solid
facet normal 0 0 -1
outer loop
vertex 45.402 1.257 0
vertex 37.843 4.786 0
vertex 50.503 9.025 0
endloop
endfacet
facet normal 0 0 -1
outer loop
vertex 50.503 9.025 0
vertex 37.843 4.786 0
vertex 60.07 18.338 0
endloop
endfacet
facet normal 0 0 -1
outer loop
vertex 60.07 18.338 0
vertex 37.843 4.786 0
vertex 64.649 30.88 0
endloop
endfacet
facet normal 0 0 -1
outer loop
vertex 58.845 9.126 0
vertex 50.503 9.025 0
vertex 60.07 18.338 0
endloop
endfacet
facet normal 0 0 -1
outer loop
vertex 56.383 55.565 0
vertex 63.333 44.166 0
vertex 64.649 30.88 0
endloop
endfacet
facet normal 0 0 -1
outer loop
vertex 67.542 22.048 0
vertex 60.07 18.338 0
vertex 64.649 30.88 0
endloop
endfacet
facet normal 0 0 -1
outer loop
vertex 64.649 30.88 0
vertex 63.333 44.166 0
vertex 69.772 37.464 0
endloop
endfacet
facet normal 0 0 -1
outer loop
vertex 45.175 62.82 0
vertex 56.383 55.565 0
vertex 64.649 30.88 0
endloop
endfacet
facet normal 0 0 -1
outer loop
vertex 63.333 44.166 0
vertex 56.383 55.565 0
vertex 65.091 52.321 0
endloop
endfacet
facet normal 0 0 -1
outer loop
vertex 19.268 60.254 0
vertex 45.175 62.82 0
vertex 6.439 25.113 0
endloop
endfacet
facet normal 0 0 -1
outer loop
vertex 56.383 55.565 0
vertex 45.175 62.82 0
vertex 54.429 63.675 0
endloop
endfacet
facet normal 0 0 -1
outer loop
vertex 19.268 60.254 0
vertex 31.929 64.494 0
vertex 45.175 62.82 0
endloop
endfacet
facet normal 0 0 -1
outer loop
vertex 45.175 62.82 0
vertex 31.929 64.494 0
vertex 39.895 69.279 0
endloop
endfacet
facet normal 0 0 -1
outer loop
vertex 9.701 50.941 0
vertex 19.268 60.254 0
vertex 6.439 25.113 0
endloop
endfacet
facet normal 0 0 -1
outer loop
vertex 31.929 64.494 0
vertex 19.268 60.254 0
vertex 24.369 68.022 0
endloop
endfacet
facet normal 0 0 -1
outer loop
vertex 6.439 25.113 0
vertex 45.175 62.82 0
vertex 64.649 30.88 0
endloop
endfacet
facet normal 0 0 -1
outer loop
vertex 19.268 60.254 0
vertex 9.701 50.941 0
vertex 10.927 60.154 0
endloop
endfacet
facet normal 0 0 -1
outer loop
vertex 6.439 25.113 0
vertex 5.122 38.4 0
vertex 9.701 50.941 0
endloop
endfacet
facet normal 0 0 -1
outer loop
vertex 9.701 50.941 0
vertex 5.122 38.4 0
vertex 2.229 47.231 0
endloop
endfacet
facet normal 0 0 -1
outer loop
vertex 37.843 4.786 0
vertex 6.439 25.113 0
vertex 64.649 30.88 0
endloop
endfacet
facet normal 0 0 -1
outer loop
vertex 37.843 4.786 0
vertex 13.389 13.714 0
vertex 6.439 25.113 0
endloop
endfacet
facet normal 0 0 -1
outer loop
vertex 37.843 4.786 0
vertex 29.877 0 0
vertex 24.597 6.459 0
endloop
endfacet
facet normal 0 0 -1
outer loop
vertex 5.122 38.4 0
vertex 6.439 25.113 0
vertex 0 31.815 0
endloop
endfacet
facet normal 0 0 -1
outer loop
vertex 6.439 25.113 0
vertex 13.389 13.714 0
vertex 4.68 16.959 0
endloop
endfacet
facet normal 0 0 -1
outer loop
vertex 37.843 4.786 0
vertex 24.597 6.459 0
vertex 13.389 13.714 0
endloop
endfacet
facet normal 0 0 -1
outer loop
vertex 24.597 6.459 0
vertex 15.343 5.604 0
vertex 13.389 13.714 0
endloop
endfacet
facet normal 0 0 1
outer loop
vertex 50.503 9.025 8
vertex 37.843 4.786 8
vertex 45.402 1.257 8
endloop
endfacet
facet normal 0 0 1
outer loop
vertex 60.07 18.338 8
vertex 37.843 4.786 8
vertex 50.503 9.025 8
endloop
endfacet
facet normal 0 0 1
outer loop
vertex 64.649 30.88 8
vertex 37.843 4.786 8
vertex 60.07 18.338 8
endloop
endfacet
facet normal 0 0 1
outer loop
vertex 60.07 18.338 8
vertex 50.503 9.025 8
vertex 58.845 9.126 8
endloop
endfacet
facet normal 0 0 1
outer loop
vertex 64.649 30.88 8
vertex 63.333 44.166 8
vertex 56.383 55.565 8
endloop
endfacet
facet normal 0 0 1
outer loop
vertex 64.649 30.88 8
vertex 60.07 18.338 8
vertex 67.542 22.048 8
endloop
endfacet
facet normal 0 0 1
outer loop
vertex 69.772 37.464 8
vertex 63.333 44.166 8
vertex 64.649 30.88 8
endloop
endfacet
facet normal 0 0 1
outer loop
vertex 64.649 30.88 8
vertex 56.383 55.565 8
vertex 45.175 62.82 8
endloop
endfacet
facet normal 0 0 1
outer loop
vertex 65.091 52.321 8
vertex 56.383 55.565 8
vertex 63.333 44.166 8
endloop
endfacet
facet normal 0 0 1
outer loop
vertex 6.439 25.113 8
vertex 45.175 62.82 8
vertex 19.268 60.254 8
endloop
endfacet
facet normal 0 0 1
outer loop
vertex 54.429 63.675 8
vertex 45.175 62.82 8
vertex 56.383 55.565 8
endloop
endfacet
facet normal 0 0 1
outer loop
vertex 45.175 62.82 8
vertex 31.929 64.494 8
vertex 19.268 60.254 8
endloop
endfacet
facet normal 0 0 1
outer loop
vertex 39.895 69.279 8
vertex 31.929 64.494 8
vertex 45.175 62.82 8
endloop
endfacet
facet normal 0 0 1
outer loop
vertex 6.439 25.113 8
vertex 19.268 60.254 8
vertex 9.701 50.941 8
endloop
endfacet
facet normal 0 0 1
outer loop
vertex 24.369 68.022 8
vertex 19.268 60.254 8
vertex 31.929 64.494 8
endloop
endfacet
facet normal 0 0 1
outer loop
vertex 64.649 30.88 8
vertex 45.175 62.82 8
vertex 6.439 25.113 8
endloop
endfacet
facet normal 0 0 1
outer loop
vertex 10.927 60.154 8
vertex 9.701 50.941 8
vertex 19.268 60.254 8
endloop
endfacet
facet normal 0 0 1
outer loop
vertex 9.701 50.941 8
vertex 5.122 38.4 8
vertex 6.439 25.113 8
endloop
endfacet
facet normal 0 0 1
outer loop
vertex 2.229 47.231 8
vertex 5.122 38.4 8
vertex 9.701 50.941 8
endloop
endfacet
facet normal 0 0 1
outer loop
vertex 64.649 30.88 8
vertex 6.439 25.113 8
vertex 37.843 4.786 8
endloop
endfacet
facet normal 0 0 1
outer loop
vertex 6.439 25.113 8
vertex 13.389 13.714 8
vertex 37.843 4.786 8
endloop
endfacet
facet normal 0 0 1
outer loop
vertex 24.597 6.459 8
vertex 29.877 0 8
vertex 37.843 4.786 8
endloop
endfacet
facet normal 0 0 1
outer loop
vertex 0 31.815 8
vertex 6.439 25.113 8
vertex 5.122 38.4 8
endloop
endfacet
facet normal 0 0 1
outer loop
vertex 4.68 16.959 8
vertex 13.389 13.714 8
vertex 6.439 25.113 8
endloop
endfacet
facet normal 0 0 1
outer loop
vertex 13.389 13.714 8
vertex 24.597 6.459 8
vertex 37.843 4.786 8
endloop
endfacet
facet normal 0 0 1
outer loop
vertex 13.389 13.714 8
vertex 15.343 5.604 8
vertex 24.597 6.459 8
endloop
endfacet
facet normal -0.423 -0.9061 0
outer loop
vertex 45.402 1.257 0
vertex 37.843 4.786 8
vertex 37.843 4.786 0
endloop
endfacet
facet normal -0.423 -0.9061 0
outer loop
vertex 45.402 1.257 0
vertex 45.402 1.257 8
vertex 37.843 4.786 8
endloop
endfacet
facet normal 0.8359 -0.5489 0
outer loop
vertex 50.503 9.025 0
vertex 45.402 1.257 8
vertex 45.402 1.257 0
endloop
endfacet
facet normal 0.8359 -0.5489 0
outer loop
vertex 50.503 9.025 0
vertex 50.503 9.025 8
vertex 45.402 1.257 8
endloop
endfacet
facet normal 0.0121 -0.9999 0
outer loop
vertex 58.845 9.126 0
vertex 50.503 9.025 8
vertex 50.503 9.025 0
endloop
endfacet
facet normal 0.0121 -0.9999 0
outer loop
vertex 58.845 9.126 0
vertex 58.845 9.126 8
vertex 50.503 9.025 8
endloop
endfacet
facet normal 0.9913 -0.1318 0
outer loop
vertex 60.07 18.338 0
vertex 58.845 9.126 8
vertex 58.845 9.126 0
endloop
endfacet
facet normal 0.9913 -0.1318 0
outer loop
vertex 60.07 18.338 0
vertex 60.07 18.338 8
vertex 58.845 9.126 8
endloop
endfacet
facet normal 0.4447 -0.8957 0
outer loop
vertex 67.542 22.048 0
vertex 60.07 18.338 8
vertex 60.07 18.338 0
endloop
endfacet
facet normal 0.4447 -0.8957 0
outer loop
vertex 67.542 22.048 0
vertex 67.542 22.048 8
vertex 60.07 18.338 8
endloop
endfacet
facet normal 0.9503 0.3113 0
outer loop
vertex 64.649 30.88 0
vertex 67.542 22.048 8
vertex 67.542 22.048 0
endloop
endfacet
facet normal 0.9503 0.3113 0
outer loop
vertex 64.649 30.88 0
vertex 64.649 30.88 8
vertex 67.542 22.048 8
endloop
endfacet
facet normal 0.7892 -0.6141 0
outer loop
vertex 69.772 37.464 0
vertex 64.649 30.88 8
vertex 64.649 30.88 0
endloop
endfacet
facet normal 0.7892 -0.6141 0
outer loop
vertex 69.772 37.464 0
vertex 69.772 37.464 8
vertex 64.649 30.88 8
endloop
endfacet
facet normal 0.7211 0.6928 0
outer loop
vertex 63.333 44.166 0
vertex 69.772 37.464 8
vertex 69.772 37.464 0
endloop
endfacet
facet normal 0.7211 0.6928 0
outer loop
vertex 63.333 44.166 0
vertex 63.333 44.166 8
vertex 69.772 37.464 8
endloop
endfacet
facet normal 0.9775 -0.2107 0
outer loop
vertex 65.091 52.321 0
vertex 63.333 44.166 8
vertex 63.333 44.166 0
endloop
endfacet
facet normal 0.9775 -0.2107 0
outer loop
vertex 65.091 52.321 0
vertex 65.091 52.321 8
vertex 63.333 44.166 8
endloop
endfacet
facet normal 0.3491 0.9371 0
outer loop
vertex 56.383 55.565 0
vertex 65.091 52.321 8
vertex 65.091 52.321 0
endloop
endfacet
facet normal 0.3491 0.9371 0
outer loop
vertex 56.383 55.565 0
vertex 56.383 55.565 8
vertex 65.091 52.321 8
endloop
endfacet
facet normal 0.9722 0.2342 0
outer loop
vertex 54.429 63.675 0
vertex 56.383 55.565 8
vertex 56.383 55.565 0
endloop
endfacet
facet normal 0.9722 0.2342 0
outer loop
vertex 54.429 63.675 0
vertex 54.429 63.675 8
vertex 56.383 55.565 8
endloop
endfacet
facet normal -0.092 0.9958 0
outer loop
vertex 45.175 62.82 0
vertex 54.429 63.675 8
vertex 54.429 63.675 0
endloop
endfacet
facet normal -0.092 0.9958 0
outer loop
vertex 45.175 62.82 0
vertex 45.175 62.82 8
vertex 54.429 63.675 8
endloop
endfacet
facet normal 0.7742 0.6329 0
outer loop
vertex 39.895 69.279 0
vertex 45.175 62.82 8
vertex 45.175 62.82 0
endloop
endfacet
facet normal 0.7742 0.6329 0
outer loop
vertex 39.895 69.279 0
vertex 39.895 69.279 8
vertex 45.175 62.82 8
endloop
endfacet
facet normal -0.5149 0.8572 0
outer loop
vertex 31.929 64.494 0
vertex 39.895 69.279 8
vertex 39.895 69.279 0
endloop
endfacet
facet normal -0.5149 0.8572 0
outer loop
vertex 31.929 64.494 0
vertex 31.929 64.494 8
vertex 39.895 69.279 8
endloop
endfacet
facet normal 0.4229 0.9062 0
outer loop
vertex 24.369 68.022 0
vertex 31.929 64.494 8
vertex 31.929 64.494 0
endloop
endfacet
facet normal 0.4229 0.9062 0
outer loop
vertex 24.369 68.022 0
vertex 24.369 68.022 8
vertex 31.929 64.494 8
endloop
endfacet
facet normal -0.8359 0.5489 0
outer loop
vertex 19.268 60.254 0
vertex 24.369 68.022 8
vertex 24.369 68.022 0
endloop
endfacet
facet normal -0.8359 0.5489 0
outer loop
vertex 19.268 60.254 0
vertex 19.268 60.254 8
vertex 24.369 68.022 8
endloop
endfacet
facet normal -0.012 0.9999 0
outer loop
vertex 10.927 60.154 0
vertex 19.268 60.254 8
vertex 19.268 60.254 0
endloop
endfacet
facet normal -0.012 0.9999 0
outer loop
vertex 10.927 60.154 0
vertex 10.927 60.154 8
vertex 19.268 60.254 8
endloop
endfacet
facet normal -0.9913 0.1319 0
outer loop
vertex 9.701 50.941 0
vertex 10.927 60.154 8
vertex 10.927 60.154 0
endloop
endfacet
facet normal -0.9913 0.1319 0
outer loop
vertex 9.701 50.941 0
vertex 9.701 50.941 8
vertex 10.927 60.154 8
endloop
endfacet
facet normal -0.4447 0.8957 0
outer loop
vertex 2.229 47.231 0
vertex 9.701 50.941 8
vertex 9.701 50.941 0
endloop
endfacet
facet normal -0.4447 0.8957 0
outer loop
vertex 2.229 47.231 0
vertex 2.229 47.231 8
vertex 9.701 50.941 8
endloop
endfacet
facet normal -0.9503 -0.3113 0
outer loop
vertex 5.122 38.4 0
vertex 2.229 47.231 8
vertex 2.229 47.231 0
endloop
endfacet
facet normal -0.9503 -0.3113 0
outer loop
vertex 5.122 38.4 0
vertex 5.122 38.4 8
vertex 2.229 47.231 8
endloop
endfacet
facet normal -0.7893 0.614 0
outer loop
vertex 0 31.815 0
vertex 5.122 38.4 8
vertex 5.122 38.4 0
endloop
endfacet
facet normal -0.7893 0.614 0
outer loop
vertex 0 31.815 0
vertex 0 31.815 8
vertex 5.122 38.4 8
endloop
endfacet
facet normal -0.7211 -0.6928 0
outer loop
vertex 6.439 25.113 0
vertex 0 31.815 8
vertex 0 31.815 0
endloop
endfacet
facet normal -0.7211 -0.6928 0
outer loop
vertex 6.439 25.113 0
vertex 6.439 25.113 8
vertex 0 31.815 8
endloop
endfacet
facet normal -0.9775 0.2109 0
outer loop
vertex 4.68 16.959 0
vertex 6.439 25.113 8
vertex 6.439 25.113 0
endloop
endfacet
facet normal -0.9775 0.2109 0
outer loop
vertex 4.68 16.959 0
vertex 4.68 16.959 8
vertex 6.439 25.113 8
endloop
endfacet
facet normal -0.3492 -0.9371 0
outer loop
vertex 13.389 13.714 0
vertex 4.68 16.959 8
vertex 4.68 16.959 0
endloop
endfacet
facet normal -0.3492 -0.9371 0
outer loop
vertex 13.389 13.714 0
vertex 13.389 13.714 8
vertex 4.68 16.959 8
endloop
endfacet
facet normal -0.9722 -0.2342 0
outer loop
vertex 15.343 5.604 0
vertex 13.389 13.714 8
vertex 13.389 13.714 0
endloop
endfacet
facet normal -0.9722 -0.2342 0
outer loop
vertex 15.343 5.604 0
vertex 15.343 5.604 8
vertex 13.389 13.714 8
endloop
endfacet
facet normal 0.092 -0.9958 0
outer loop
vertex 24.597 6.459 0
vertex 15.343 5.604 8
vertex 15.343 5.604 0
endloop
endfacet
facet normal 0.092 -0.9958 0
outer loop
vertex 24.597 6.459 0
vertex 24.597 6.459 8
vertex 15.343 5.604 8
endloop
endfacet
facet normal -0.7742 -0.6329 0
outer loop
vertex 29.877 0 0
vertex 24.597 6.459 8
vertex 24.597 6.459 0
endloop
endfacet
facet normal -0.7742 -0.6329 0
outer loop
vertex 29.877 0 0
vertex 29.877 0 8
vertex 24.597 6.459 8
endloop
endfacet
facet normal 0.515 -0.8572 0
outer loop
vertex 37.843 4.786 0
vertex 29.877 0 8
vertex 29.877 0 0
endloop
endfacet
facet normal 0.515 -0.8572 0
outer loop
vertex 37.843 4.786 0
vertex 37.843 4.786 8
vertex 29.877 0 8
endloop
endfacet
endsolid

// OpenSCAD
$fn = 32;

// ----------------------------------------------------------------------
// Chain sprocket: 14 teeth, 30 mm root radius
// ----------------------------------------------------------------------

// --- parameters (mm) ---
profile_height = 8;       // extrusion height
profile_points = 28;      // points of the closed outline

profile = [[64.649, 30.88], [69.772, 37.464], [63.333, 44.166], [65.091, 52.321], [56.383, 55.565], [54.429, 63.675], [45.175, 62.82], [39.895, 69.279], [31.929, 64.494], [24.369, 68.022], [19.268, 60.254], [10.927, 60.154], [9.701, 50.941], [2.229, 47.231], [5.122, 38.4], [0, 31.815], [6.439, 25.113], [4.68, 16.959], [13.389, 13.714], [15.343, 5.604], [24.597, 6.459], [29.877, 0], [37.843, 4.786], [45.402, 1.257], [50.503, 9.025], [58.845, 9.126], [60.07, 18.338], [67.542, 22.048]];  // single closed polygon, 28 points, counter clockwise

// --- the one profile operation ---
linear_extrude(height = profile_height) polygon(points = profile);
